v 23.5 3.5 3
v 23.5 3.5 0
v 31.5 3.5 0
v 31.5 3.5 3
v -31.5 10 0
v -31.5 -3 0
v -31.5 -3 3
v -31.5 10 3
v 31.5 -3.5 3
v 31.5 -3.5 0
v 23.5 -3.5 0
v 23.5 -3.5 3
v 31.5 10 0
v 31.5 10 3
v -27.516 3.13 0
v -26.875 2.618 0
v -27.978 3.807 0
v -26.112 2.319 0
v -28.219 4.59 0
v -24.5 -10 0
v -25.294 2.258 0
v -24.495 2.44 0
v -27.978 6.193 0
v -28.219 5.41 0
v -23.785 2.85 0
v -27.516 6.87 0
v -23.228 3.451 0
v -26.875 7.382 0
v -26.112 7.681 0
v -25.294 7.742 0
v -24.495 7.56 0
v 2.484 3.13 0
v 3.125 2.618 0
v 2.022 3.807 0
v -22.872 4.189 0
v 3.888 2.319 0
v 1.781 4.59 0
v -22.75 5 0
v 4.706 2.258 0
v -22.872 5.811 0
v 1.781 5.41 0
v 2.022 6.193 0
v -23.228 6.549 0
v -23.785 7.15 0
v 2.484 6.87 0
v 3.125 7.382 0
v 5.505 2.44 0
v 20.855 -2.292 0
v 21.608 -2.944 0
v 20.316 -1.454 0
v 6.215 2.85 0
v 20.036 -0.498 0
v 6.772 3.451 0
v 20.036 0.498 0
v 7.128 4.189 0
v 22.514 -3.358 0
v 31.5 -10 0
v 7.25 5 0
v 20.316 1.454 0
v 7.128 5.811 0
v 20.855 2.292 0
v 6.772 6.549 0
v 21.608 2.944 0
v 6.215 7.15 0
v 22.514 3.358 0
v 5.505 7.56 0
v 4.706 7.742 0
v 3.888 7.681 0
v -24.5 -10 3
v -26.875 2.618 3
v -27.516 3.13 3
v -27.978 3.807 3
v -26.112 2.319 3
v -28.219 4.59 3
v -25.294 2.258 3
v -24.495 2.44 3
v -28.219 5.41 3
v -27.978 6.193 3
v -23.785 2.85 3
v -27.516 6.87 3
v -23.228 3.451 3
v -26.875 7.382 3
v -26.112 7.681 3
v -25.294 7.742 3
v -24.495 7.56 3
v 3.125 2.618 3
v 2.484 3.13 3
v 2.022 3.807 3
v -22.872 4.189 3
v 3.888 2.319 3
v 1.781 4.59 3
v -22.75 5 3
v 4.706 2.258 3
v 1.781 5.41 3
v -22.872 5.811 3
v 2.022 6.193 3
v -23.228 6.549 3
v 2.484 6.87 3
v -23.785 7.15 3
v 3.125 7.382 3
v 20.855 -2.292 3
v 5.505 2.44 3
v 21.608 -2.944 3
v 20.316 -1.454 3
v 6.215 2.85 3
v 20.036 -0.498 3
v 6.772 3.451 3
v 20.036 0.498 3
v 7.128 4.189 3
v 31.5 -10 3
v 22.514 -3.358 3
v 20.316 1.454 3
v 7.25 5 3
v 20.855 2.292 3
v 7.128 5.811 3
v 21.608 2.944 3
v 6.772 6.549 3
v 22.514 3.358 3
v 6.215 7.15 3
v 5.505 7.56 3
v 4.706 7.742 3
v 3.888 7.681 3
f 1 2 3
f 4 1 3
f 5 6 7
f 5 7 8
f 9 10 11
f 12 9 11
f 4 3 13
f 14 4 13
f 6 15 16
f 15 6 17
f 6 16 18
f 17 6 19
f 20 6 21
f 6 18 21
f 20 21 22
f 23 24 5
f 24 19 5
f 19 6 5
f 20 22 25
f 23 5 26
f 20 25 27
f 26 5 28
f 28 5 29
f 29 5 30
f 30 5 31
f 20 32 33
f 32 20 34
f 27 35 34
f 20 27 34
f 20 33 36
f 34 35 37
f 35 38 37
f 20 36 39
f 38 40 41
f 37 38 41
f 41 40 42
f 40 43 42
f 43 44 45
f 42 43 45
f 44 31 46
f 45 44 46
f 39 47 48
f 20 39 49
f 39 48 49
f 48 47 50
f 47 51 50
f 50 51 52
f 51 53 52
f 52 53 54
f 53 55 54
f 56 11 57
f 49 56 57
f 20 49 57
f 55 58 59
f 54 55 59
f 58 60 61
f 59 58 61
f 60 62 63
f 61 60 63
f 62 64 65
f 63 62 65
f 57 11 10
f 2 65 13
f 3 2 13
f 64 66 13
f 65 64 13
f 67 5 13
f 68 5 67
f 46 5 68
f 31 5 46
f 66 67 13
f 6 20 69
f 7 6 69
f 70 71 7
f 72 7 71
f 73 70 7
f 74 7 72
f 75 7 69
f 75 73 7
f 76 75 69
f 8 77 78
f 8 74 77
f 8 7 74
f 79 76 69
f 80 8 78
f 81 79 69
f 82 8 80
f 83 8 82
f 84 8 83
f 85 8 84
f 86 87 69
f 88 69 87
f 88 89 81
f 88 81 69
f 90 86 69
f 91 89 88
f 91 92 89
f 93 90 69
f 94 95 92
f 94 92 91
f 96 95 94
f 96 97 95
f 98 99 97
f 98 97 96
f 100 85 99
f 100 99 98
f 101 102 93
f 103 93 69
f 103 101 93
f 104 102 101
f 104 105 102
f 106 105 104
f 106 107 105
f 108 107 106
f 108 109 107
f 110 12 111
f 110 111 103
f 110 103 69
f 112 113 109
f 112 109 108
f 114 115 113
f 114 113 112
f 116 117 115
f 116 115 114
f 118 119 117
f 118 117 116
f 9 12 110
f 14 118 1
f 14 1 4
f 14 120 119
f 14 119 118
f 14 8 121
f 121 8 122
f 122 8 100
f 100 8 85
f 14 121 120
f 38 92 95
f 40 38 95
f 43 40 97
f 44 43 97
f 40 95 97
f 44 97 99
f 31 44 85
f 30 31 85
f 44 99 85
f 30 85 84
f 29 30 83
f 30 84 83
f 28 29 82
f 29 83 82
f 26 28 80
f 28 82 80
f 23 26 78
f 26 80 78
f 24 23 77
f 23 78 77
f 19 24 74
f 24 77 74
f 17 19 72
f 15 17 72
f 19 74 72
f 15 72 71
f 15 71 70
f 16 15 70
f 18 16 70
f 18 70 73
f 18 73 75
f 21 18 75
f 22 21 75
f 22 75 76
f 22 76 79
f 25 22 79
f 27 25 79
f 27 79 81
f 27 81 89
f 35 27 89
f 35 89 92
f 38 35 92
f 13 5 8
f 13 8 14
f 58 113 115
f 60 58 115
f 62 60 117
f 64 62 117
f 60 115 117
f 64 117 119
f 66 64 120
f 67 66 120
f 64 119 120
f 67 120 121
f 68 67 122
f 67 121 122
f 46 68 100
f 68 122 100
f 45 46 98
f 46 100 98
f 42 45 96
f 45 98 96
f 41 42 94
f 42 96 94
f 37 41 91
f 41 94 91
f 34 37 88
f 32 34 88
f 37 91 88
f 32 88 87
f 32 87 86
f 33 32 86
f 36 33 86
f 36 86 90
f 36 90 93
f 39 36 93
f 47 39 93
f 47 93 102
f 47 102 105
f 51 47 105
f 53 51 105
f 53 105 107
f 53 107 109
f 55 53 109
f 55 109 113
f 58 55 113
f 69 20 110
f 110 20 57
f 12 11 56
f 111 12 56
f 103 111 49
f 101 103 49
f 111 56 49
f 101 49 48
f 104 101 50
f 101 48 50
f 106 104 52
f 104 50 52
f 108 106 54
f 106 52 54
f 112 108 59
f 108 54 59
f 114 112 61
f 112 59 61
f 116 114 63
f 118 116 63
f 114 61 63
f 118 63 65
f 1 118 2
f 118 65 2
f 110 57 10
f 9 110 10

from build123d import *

# Parameters (mm, degrees)
SKETCH_1_W          = 63
SKETCH_1_H          = 20
EXTRUDE_1_DEPTH     = 3
HOLE_WIZARD_M5_1_D  = 5.5
CUT_EXTRUDE_1_DEPTH = 34.185087012
CHAMFER_1_SIZE      = 7


with BuildPart() as part:
    # 草图1 → 凸台-拉伸1 (new body)
    with BuildSketch(Plane.XY):
        Rectangle(SKETCH_1_W, SKETCH_1_H)
    extrude(amount=EXTRUDE_1_DEPTH)

    # M5 间隙孔1 (through all)
    with Locations(Plane(origin=(0, 0, 0), x_dir=(-1, 0, 0), z_dir=(0, 0, -1))):
        with Locations((25.5, 5), (-4.5, 5)):
            Hole(HOLE_WIZARD_M5_1_D / 2)

    # 草图5 → 切除-拉伸1 (cut, through all)
    with BuildSketch(Plane(origin=(0, 0, 0), x_dir=(-1, 0, 0), z_dir=(0, 0, -1))):
        with BuildLine():
            Line((-23.5, 3.5), (-31.5, 3.5))
            Line((-31.5, 3.5), (-31.5, -3.5))
            Line((-31.5, -3.5), (-23.5, -3.5))
            ThreePointArc((-23.5, -3.5), (-20, 0), (-23.5, 3.5))
        make_face()
    extrude(amount=-CUT_EXTRUDE_1_DEPTH, mode=Mode.SUBTRACT)

    # 倒角1
    chamfer_1_edges = [part.edges().sort_by_distance(p)[0] for p in [
        (-31.5, -10, 1.5),
    ]]
    chamfer(chamfer_1_edges, length=CHAMFER_1_SIZE)


solid = part.part
